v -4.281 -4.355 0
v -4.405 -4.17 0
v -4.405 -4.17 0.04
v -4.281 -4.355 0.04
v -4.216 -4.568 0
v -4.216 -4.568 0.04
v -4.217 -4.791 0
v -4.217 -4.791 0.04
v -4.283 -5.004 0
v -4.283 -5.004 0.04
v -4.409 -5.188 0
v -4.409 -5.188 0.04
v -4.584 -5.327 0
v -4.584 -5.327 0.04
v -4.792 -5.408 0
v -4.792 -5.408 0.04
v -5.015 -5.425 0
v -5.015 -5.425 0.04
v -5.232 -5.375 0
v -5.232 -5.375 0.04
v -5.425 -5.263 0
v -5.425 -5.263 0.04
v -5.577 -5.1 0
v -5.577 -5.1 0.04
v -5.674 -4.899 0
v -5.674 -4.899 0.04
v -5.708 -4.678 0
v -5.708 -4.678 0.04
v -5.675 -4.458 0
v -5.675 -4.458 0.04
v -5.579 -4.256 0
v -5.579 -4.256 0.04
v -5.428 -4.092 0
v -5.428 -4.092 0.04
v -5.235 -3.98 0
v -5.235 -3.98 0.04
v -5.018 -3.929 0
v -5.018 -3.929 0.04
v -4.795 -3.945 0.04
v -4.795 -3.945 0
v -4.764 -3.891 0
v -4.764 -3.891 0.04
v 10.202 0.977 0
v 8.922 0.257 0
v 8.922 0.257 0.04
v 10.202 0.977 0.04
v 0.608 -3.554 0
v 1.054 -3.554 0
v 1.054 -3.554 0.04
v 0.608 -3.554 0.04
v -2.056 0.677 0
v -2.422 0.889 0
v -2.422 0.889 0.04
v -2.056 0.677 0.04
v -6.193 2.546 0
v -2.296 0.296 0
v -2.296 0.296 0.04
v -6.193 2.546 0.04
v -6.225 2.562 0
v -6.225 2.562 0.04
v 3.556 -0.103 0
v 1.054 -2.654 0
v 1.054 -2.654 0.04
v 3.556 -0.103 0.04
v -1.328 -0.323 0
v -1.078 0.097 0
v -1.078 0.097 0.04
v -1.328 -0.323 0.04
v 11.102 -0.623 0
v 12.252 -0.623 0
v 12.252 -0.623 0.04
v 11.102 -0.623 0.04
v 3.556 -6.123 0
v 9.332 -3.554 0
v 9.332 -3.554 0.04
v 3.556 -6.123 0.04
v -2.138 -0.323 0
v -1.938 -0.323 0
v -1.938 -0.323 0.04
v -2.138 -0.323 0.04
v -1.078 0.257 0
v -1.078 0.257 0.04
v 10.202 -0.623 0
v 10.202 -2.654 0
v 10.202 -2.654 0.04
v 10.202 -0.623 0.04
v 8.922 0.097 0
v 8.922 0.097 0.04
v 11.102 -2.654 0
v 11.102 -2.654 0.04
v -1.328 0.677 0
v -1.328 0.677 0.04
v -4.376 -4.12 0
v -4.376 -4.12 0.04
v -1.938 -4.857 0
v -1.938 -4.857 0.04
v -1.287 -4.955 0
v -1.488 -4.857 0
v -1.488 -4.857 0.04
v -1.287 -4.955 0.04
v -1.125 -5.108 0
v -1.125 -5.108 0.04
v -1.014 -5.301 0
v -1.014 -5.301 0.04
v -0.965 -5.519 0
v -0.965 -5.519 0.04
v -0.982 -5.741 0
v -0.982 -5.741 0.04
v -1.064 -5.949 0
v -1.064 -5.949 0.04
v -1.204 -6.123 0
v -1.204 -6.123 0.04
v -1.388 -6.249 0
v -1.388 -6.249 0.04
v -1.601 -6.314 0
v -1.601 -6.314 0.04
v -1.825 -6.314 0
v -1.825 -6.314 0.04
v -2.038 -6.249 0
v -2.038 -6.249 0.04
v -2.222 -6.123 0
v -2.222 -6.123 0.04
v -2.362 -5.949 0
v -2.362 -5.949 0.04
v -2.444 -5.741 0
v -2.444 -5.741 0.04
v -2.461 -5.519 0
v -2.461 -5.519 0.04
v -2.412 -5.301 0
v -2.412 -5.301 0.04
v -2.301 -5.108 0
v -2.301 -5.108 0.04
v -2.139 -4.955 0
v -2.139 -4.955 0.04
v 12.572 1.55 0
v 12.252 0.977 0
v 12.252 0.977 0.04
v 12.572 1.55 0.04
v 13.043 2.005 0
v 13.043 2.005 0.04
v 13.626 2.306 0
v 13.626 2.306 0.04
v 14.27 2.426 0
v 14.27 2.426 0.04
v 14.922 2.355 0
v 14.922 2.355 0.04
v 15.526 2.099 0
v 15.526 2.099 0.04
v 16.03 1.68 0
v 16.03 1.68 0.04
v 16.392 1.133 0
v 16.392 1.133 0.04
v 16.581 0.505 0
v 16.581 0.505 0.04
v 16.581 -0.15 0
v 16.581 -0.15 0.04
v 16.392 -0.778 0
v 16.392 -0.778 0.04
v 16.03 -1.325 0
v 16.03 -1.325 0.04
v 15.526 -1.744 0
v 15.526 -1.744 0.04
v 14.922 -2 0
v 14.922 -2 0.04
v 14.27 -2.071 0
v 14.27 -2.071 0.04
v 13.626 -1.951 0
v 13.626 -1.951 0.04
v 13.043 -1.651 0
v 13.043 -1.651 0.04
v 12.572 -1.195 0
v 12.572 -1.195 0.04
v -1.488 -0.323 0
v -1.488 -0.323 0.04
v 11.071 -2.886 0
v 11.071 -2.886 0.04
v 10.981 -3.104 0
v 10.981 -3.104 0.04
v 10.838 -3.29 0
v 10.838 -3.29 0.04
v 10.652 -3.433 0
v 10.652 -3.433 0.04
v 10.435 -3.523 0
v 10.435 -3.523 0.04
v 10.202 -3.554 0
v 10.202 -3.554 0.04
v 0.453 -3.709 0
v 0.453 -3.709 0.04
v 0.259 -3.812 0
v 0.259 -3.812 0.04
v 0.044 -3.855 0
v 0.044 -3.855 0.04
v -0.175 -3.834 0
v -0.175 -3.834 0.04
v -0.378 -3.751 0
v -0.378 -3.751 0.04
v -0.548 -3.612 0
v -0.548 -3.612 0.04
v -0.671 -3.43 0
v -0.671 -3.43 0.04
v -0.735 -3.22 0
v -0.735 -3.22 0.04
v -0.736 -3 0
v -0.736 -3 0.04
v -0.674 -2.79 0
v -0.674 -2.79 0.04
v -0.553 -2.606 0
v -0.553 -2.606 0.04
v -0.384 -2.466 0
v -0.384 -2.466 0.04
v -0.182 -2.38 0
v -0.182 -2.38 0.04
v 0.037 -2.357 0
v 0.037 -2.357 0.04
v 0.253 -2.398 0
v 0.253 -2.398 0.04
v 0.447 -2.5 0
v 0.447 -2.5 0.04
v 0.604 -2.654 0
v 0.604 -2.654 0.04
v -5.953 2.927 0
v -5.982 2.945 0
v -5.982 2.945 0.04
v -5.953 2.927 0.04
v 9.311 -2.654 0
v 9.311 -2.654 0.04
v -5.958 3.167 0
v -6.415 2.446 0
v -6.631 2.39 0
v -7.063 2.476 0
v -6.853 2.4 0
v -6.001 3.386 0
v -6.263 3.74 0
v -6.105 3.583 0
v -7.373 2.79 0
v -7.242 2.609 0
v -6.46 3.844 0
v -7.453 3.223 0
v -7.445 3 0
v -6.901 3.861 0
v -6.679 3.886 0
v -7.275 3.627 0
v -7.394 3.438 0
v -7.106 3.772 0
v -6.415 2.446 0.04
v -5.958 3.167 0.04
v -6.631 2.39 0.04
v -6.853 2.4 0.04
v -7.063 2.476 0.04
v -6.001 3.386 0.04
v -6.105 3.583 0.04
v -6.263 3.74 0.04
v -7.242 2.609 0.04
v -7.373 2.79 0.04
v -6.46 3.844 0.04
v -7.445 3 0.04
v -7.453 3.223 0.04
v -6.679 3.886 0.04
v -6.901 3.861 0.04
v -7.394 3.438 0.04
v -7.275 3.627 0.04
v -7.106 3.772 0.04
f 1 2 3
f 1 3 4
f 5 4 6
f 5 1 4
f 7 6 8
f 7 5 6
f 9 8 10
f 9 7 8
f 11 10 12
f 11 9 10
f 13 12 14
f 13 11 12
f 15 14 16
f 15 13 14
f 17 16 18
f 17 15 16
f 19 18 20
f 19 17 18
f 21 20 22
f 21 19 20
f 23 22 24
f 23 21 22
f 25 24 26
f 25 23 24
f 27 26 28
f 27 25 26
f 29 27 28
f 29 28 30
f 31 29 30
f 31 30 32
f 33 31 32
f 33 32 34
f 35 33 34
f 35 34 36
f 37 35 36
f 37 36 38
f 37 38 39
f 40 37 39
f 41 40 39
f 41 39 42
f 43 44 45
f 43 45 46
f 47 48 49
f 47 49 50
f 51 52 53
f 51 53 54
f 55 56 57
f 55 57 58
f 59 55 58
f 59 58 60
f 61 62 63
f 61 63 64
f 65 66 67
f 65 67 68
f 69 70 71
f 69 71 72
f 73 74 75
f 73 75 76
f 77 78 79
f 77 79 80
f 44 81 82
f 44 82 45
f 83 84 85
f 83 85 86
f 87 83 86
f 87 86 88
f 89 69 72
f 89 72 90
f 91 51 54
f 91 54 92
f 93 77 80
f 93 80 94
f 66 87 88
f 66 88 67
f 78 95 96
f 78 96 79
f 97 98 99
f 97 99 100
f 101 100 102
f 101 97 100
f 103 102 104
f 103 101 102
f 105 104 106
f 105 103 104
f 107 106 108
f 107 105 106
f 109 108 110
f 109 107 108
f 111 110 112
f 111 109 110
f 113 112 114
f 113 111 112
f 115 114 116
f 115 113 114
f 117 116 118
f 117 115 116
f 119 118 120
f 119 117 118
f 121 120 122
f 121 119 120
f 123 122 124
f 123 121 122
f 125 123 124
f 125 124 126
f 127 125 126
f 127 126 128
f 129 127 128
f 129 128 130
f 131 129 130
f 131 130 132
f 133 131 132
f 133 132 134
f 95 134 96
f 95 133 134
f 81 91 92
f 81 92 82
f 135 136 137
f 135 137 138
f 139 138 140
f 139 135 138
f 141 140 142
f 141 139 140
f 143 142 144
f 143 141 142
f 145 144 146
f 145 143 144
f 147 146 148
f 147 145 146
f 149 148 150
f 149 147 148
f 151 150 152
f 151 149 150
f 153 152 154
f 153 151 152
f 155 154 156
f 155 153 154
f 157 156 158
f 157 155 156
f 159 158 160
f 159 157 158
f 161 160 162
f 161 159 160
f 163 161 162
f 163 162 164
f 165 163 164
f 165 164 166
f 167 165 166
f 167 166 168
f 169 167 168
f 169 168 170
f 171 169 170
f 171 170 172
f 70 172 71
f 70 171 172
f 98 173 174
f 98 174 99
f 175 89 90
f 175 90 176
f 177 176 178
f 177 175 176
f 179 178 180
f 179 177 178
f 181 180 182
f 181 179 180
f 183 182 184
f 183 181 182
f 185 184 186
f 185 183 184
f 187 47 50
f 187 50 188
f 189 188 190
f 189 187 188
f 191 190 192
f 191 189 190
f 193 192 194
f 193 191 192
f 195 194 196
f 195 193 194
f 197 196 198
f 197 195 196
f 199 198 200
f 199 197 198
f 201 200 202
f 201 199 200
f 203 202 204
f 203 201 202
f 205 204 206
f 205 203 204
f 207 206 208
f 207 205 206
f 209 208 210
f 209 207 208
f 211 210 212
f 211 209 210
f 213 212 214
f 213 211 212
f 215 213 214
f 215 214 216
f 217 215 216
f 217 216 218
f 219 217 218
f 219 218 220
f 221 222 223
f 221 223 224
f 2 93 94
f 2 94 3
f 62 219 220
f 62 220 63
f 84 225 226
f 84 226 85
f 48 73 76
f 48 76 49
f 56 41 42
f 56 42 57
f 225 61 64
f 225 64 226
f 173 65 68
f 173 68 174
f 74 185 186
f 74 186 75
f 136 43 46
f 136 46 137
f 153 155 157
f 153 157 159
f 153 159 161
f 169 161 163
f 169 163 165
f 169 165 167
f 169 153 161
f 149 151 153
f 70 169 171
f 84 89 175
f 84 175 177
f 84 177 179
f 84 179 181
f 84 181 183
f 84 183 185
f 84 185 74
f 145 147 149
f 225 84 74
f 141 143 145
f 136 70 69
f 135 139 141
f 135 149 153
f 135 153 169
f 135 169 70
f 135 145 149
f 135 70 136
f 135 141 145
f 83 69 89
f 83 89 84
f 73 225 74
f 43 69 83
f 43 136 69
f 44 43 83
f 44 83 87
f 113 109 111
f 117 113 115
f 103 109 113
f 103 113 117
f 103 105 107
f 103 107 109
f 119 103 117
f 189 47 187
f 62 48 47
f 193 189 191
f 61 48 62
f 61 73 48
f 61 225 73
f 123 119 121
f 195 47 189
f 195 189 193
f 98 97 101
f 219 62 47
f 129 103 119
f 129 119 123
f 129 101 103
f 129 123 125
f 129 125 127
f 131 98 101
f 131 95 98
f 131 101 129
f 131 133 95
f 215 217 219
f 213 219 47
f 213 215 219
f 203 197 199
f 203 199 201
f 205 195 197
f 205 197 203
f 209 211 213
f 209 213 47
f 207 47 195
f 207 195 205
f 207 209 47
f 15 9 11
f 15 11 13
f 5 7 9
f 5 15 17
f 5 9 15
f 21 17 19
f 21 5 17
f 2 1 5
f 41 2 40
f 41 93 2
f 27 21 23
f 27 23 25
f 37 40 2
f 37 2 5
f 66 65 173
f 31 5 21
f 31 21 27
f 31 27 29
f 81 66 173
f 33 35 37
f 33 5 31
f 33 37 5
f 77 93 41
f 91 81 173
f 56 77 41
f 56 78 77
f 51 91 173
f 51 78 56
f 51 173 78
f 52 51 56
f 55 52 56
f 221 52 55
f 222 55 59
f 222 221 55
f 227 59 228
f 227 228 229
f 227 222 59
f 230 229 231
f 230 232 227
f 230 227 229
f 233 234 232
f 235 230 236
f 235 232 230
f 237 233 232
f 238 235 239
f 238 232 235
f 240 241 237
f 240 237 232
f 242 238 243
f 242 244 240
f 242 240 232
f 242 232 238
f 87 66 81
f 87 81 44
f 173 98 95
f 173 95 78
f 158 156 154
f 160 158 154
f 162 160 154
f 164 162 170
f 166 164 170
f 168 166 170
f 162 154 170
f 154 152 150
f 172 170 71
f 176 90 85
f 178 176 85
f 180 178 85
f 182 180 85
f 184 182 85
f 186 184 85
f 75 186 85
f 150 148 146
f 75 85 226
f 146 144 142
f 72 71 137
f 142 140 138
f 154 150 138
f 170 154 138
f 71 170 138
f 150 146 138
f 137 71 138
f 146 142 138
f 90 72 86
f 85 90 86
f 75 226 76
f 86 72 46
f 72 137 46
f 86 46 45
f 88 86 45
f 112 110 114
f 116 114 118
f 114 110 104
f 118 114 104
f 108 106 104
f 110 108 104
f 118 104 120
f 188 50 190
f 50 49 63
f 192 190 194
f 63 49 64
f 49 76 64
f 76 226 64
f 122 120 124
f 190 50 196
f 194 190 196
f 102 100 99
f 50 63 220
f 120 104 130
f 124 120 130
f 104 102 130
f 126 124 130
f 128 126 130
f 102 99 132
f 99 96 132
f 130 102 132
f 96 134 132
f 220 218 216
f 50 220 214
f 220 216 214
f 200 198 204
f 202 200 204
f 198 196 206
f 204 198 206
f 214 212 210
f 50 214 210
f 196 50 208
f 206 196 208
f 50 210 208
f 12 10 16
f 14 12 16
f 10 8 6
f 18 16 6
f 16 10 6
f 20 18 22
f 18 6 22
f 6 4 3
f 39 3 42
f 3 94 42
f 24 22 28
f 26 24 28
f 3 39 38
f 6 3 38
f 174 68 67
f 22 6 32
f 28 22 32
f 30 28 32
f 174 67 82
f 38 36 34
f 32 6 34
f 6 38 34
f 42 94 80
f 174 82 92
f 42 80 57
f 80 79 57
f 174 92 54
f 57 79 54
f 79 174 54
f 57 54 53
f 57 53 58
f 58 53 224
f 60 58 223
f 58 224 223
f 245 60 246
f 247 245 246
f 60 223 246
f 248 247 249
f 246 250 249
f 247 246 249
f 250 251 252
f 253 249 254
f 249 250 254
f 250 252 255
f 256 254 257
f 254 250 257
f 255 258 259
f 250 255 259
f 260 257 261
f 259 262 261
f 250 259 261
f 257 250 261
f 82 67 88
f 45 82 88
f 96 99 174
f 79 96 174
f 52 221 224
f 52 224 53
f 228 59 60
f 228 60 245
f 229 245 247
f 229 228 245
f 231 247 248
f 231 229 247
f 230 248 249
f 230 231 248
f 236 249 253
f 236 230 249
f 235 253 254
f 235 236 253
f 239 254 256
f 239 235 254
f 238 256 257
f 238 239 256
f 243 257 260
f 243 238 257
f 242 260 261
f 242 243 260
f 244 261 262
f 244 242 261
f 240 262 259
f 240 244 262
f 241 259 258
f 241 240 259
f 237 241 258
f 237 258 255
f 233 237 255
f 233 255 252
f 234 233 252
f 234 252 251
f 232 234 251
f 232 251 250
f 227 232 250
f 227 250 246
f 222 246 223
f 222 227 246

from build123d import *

# Parameters (mm, degrees)
BOSS_EXTRUDE1_DEPTH = 0.04


with BuildPart() as part:
    # Sketch1 → Boss-Extrude1 (new body)
    with BuildSketch(Plane.XY):
        with BuildLine():
            Line((-1.32802474, 0.67738204), (-1.07802474, 0.25738204))
            Line((-1.07802474, 0.25738204), (8.92197526, 0.25738204))
            Line((8.92197526, 0.25738204), (10.20197526, 0.97738204))
            Line((10.20197526, 0.97738204), (10.514497177, 0.97738204))
            Line((10.514497177, 0.97738204), (10.93536953, 0.97738204))
            Line((10.93536953, 0.97738204), (12.25197526, 0.97738204))
            ThreePointArc((12.25197526, 0.97738204), (16.604949345, 0.17738204), (12.25197526, -0.62261796))
            Line((12.25197526, -0.62261796), (11.10197526, -0.62261796))
            Line((11.10197526, -0.62261796), (11.10197526, -1.42261796))
            Line((11.10197526, -1.42261796), (11.10197526, -1.527549767))
            Line((11.10197526, -1.527549767), (11.10197526, -2.327549767))
            Line((11.10197526, -2.327549767), (11.10197526, -2.653523035))
            ThreePointArc((11.10197526, -2.653523035), (10.838371363, -3.289919138), (10.20197526, -3.553523035))
            Line((10.20197526, -3.553523035), (9.33171427, -3.553523035))
            Line((9.33171427, -3.553523035), (3.555572379, -6.12261796))
            Line((3.555572379, -6.12261796), (1.054032996, -3.553523035))
            Line((1.054032996, -3.553523035), (0.608362539, -3.553523035))
            ThreePointArc((0.608362539, -3.553523035), (-0.743782707, -3.110017255), (0.604032996, -2.653523035))
            Line((0.604032996, -2.653523035), (1.054032996, -2.653523035))
            Line((1.054032996, -2.653523035), (3.555572379, -0.10261796))
            Line((3.555572379, -0.10261796), (9.311250991, -2.653523035))
            Line((9.311250991, -2.653523035), (10.20197526, -2.653523035))
            Line((10.20197526, -2.653523035), (10.20197526, -2.327549767))
            Line((10.20197526, -2.327549767), (10.20197526, -1.52261796))
            Line((10.20197526, -1.52261796), (10.20197526, -1.42261796))
            Line((10.20197526, -1.42261796), (10.20197526, -0.62261796))
            Line((10.20197526, -0.62261796), (8.92197526, 0.09738204))
            Line((8.92197526, 0.09738204), (-1.07802474, 0.09738204))
            Line((-1.07802474, 0.09738204), (-1.32802474, -0.32261796))
            Line((-1.32802474, -0.32261796), (-1.48802474, -0.32261796))
            Line((-1.48802474, -0.32261796), (-1.48802474, -4.82261796))
            Line((-1.48802474, -4.82261796), (-1.48802474, -4.857163559))
            ThreePointArc((-1.48802474, -4.857163559), (-1.71302474, -6.32261796), (-1.93802474, -4.857163559))
            Line((-1.93802474, -4.857163559), (-1.93802474, -4.82261796))
            Line((-1.93802474, -4.82261796), (-1.93802474, -0.32261796))
            Line((-1.93802474, -0.32261796), (-2.13802474, -0.32261796))
            Line((-2.13802474, -0.32261796), (-4.375941954, -4.119846244))
            Line((-4.375941954, -4.119846244), (-4.405297747, -4.16965624))
            ThreePointArc((-4.405297747, -4.16965624), (-5.332880663, -5.32627698), (-4.795009179, -3.94465624))
            Line((-4.795009179, -3.94465624), (-4.763622434, -3.891364637))
            Line((-4.763622434, -3.891364637), (-2.295650959, 0.296212559))
            Line((-2.295650959, 0.296212559), (-6.192765276, 2.546212559))
            Line((-6.192765276, 2.546212559), (-6.224617122, 2.562462753))
            ThreePointArc((-6.224617122, 2.562462753), (-7.341518741, 3.537122923), (-5.982350992, 2.945434913))
            Line((-5.982350992, 2.945434913), (-5.952970183, 2.92738204))
            Line((-5.952970183, 2.92738204), (-2.421945704, 0.888744107))
            Line((-2.421945704, 0.888744107), (-2.055855866, 0.67738204))
            Line((-2.055855866, 0.67738204), (-1.625502745, 0.67738204))
            Line((-1.625502745, 0.67738204), (-1.32802474, 0.67738204))
        make_face()
    extrude(amount=BOSS_EXTRUDE1_DEPTH)


solid = part.part
